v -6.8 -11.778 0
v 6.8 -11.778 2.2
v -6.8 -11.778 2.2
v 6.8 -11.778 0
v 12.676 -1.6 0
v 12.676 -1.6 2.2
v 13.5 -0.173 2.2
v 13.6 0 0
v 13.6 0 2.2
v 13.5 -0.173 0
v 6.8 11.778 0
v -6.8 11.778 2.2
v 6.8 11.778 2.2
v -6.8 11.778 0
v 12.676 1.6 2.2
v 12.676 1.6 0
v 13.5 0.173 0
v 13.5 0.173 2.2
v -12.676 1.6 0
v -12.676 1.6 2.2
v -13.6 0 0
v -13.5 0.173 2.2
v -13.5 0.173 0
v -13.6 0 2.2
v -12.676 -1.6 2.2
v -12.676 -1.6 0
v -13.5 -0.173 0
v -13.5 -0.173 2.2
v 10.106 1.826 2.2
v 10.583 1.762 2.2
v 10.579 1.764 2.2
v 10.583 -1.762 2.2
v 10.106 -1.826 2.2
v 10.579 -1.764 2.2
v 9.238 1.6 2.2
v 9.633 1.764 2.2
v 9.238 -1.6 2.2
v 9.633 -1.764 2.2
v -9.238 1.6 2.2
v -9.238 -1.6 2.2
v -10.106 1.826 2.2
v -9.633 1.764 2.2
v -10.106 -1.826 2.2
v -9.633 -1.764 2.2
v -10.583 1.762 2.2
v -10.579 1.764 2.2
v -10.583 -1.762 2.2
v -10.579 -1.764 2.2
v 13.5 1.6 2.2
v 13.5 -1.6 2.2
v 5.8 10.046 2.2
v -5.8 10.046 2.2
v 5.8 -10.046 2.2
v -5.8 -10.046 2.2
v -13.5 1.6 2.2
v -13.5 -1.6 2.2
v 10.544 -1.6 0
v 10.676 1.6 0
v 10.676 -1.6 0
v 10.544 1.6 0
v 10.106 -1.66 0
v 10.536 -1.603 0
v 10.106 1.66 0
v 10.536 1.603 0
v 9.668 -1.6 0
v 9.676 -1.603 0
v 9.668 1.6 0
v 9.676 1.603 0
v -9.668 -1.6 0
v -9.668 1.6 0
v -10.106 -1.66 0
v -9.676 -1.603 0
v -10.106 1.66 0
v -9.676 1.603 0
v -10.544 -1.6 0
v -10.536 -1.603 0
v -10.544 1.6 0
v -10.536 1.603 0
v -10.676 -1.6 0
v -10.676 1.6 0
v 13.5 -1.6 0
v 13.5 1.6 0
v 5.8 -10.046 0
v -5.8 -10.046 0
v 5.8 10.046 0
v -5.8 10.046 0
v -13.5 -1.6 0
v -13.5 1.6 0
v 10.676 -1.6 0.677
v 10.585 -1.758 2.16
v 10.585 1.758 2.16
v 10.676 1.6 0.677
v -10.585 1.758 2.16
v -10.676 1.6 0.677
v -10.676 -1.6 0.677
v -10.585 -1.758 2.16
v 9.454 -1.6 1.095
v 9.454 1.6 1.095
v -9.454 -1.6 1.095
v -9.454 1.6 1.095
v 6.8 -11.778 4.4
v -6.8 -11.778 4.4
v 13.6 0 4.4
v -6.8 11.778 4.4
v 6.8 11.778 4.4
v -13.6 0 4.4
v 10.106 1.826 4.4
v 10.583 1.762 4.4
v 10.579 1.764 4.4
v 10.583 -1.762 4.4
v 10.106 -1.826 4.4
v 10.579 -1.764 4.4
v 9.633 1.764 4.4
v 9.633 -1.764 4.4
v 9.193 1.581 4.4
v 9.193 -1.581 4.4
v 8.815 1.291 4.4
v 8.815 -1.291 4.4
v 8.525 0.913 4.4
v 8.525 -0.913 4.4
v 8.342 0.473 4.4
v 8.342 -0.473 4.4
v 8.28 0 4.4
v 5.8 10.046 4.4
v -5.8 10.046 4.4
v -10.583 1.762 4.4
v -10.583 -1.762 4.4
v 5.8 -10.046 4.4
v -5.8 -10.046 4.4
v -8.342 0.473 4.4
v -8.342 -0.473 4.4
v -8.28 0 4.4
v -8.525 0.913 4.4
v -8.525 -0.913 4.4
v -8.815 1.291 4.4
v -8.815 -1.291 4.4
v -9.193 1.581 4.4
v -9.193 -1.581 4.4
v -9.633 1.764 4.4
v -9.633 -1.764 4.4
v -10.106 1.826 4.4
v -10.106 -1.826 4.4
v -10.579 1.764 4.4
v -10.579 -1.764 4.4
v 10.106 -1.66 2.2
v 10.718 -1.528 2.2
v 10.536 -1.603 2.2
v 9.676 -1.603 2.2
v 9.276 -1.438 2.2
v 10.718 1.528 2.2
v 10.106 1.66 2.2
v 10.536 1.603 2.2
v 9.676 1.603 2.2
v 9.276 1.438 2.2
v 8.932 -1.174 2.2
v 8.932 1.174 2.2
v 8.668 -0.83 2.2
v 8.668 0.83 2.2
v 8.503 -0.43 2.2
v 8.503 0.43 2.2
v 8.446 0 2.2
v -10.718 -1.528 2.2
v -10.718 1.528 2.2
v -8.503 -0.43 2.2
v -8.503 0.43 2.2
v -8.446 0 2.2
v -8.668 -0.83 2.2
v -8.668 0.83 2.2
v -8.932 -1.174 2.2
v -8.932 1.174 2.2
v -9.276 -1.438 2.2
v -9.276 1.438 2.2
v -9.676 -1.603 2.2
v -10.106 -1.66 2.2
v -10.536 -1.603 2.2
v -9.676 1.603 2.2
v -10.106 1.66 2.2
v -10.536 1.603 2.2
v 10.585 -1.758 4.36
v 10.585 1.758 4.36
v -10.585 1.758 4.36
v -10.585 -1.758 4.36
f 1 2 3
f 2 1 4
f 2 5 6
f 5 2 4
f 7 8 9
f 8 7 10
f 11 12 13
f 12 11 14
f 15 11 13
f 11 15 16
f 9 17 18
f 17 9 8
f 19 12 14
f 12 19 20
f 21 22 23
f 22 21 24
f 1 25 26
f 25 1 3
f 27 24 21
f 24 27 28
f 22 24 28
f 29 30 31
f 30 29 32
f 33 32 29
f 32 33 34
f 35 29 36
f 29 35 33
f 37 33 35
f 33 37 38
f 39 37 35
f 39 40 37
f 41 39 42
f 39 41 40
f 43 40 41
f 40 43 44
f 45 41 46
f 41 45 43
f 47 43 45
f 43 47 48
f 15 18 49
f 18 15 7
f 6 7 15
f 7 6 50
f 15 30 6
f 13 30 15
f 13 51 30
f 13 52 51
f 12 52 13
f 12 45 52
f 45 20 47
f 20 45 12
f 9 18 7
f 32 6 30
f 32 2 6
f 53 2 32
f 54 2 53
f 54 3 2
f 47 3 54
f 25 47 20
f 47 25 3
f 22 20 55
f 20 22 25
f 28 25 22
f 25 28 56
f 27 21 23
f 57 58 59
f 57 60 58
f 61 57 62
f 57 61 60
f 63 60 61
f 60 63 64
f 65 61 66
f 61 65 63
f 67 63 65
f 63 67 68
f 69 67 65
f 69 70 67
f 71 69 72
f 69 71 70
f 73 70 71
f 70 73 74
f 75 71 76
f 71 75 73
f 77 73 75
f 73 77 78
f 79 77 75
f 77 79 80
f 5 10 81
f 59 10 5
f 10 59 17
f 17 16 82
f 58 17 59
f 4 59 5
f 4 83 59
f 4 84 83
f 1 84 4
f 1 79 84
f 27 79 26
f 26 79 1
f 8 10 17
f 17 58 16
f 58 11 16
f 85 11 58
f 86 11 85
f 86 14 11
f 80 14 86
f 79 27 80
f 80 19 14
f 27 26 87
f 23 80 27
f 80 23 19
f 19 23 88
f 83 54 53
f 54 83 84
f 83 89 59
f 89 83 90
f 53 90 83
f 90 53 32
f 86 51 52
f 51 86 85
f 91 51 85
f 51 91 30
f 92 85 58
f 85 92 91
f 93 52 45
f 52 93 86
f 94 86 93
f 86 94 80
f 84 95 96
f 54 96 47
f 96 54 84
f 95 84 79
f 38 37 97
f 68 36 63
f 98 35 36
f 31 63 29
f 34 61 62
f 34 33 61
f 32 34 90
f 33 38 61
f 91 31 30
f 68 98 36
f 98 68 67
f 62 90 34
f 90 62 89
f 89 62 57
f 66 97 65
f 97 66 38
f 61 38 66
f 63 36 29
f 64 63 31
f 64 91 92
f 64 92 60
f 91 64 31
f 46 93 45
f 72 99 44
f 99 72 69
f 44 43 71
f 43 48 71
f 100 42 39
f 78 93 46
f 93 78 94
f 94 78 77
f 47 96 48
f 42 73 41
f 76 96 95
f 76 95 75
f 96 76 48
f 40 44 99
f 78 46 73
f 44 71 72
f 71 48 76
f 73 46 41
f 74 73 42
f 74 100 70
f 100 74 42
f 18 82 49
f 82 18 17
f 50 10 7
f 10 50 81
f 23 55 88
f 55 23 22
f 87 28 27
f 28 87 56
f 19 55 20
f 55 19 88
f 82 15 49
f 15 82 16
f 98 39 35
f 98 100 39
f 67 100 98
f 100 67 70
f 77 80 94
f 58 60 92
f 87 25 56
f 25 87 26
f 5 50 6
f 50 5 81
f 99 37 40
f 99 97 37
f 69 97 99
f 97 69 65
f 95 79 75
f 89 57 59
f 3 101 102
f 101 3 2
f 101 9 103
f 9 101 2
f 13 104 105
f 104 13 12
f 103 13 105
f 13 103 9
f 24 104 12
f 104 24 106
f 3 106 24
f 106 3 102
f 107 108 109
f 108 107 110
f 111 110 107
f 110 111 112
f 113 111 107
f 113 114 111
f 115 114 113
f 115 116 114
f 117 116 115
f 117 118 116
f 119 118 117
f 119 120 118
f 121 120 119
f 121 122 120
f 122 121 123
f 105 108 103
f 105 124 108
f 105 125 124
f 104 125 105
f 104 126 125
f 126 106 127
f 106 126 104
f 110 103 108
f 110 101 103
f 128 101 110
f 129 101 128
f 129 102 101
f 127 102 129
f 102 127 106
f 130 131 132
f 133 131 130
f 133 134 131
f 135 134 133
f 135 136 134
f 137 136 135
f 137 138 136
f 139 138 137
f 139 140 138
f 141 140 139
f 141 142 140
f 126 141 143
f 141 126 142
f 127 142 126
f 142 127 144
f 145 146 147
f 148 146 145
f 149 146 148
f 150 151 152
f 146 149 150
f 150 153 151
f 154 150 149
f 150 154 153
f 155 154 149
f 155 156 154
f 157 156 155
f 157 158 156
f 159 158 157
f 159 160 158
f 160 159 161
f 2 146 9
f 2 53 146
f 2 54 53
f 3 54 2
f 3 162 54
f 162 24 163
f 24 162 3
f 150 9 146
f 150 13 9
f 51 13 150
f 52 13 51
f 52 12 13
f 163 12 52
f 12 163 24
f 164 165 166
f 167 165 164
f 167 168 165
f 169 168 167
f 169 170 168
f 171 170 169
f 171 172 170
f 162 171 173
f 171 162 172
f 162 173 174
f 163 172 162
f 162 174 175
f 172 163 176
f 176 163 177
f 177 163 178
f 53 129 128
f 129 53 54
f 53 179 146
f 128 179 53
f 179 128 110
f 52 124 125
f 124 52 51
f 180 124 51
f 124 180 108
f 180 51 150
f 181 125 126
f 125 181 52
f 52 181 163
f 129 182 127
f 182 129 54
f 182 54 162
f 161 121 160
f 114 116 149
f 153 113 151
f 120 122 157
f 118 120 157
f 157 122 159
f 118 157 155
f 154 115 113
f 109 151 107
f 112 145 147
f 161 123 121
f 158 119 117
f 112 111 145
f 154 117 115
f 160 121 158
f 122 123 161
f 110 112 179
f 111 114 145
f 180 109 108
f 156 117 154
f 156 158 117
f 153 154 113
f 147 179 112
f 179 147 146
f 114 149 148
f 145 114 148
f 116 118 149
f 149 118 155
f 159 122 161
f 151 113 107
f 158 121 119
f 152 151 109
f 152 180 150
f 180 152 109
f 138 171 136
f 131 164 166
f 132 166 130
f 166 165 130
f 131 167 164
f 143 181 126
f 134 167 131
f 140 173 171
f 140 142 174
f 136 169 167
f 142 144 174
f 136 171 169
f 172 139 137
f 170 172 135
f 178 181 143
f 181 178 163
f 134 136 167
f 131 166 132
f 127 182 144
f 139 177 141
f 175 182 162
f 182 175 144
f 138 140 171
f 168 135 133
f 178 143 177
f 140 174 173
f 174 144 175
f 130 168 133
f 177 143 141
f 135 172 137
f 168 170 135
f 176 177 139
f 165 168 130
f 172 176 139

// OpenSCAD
module creeXMLHolder(tolerance=0.2){
  stubRadius = (3.12 + tolerance)/2;

  OR = (27 + tolerance)/2;
  IR = (23 + tolerance)/2;

  union(){
    difference(){
      cylinder(r=OR, h=2.2, $fn=6);  

      translate([0,0,-1])
      cylinder(r=IR, h=4, $fn=6);
    }
    
    translate([IR - stubRadius*0.9,0,0])
    cylinder(r1=stubRadius,r2=stubRadius*1.1, h=2.2, $fn=24);
    
    translate([IR - stubRadius*0.9,0,0]*-1)
    cylinder(r1=stubRadius,r2=stubRadius*1.1, h=2.2, $fn=24);
  }
}
  
module frame() {
    
  union() {
    retainingRodSize = [27,3.2,0];
    union(){
      creeXMLHolder();

      translate(retainingRodSize*-.5)
        cube(retainingRodSize+[0,0,2.2]);
    }

    translate([0,0,2.2])
      creeXMLHolder();
  }
}

frame();
